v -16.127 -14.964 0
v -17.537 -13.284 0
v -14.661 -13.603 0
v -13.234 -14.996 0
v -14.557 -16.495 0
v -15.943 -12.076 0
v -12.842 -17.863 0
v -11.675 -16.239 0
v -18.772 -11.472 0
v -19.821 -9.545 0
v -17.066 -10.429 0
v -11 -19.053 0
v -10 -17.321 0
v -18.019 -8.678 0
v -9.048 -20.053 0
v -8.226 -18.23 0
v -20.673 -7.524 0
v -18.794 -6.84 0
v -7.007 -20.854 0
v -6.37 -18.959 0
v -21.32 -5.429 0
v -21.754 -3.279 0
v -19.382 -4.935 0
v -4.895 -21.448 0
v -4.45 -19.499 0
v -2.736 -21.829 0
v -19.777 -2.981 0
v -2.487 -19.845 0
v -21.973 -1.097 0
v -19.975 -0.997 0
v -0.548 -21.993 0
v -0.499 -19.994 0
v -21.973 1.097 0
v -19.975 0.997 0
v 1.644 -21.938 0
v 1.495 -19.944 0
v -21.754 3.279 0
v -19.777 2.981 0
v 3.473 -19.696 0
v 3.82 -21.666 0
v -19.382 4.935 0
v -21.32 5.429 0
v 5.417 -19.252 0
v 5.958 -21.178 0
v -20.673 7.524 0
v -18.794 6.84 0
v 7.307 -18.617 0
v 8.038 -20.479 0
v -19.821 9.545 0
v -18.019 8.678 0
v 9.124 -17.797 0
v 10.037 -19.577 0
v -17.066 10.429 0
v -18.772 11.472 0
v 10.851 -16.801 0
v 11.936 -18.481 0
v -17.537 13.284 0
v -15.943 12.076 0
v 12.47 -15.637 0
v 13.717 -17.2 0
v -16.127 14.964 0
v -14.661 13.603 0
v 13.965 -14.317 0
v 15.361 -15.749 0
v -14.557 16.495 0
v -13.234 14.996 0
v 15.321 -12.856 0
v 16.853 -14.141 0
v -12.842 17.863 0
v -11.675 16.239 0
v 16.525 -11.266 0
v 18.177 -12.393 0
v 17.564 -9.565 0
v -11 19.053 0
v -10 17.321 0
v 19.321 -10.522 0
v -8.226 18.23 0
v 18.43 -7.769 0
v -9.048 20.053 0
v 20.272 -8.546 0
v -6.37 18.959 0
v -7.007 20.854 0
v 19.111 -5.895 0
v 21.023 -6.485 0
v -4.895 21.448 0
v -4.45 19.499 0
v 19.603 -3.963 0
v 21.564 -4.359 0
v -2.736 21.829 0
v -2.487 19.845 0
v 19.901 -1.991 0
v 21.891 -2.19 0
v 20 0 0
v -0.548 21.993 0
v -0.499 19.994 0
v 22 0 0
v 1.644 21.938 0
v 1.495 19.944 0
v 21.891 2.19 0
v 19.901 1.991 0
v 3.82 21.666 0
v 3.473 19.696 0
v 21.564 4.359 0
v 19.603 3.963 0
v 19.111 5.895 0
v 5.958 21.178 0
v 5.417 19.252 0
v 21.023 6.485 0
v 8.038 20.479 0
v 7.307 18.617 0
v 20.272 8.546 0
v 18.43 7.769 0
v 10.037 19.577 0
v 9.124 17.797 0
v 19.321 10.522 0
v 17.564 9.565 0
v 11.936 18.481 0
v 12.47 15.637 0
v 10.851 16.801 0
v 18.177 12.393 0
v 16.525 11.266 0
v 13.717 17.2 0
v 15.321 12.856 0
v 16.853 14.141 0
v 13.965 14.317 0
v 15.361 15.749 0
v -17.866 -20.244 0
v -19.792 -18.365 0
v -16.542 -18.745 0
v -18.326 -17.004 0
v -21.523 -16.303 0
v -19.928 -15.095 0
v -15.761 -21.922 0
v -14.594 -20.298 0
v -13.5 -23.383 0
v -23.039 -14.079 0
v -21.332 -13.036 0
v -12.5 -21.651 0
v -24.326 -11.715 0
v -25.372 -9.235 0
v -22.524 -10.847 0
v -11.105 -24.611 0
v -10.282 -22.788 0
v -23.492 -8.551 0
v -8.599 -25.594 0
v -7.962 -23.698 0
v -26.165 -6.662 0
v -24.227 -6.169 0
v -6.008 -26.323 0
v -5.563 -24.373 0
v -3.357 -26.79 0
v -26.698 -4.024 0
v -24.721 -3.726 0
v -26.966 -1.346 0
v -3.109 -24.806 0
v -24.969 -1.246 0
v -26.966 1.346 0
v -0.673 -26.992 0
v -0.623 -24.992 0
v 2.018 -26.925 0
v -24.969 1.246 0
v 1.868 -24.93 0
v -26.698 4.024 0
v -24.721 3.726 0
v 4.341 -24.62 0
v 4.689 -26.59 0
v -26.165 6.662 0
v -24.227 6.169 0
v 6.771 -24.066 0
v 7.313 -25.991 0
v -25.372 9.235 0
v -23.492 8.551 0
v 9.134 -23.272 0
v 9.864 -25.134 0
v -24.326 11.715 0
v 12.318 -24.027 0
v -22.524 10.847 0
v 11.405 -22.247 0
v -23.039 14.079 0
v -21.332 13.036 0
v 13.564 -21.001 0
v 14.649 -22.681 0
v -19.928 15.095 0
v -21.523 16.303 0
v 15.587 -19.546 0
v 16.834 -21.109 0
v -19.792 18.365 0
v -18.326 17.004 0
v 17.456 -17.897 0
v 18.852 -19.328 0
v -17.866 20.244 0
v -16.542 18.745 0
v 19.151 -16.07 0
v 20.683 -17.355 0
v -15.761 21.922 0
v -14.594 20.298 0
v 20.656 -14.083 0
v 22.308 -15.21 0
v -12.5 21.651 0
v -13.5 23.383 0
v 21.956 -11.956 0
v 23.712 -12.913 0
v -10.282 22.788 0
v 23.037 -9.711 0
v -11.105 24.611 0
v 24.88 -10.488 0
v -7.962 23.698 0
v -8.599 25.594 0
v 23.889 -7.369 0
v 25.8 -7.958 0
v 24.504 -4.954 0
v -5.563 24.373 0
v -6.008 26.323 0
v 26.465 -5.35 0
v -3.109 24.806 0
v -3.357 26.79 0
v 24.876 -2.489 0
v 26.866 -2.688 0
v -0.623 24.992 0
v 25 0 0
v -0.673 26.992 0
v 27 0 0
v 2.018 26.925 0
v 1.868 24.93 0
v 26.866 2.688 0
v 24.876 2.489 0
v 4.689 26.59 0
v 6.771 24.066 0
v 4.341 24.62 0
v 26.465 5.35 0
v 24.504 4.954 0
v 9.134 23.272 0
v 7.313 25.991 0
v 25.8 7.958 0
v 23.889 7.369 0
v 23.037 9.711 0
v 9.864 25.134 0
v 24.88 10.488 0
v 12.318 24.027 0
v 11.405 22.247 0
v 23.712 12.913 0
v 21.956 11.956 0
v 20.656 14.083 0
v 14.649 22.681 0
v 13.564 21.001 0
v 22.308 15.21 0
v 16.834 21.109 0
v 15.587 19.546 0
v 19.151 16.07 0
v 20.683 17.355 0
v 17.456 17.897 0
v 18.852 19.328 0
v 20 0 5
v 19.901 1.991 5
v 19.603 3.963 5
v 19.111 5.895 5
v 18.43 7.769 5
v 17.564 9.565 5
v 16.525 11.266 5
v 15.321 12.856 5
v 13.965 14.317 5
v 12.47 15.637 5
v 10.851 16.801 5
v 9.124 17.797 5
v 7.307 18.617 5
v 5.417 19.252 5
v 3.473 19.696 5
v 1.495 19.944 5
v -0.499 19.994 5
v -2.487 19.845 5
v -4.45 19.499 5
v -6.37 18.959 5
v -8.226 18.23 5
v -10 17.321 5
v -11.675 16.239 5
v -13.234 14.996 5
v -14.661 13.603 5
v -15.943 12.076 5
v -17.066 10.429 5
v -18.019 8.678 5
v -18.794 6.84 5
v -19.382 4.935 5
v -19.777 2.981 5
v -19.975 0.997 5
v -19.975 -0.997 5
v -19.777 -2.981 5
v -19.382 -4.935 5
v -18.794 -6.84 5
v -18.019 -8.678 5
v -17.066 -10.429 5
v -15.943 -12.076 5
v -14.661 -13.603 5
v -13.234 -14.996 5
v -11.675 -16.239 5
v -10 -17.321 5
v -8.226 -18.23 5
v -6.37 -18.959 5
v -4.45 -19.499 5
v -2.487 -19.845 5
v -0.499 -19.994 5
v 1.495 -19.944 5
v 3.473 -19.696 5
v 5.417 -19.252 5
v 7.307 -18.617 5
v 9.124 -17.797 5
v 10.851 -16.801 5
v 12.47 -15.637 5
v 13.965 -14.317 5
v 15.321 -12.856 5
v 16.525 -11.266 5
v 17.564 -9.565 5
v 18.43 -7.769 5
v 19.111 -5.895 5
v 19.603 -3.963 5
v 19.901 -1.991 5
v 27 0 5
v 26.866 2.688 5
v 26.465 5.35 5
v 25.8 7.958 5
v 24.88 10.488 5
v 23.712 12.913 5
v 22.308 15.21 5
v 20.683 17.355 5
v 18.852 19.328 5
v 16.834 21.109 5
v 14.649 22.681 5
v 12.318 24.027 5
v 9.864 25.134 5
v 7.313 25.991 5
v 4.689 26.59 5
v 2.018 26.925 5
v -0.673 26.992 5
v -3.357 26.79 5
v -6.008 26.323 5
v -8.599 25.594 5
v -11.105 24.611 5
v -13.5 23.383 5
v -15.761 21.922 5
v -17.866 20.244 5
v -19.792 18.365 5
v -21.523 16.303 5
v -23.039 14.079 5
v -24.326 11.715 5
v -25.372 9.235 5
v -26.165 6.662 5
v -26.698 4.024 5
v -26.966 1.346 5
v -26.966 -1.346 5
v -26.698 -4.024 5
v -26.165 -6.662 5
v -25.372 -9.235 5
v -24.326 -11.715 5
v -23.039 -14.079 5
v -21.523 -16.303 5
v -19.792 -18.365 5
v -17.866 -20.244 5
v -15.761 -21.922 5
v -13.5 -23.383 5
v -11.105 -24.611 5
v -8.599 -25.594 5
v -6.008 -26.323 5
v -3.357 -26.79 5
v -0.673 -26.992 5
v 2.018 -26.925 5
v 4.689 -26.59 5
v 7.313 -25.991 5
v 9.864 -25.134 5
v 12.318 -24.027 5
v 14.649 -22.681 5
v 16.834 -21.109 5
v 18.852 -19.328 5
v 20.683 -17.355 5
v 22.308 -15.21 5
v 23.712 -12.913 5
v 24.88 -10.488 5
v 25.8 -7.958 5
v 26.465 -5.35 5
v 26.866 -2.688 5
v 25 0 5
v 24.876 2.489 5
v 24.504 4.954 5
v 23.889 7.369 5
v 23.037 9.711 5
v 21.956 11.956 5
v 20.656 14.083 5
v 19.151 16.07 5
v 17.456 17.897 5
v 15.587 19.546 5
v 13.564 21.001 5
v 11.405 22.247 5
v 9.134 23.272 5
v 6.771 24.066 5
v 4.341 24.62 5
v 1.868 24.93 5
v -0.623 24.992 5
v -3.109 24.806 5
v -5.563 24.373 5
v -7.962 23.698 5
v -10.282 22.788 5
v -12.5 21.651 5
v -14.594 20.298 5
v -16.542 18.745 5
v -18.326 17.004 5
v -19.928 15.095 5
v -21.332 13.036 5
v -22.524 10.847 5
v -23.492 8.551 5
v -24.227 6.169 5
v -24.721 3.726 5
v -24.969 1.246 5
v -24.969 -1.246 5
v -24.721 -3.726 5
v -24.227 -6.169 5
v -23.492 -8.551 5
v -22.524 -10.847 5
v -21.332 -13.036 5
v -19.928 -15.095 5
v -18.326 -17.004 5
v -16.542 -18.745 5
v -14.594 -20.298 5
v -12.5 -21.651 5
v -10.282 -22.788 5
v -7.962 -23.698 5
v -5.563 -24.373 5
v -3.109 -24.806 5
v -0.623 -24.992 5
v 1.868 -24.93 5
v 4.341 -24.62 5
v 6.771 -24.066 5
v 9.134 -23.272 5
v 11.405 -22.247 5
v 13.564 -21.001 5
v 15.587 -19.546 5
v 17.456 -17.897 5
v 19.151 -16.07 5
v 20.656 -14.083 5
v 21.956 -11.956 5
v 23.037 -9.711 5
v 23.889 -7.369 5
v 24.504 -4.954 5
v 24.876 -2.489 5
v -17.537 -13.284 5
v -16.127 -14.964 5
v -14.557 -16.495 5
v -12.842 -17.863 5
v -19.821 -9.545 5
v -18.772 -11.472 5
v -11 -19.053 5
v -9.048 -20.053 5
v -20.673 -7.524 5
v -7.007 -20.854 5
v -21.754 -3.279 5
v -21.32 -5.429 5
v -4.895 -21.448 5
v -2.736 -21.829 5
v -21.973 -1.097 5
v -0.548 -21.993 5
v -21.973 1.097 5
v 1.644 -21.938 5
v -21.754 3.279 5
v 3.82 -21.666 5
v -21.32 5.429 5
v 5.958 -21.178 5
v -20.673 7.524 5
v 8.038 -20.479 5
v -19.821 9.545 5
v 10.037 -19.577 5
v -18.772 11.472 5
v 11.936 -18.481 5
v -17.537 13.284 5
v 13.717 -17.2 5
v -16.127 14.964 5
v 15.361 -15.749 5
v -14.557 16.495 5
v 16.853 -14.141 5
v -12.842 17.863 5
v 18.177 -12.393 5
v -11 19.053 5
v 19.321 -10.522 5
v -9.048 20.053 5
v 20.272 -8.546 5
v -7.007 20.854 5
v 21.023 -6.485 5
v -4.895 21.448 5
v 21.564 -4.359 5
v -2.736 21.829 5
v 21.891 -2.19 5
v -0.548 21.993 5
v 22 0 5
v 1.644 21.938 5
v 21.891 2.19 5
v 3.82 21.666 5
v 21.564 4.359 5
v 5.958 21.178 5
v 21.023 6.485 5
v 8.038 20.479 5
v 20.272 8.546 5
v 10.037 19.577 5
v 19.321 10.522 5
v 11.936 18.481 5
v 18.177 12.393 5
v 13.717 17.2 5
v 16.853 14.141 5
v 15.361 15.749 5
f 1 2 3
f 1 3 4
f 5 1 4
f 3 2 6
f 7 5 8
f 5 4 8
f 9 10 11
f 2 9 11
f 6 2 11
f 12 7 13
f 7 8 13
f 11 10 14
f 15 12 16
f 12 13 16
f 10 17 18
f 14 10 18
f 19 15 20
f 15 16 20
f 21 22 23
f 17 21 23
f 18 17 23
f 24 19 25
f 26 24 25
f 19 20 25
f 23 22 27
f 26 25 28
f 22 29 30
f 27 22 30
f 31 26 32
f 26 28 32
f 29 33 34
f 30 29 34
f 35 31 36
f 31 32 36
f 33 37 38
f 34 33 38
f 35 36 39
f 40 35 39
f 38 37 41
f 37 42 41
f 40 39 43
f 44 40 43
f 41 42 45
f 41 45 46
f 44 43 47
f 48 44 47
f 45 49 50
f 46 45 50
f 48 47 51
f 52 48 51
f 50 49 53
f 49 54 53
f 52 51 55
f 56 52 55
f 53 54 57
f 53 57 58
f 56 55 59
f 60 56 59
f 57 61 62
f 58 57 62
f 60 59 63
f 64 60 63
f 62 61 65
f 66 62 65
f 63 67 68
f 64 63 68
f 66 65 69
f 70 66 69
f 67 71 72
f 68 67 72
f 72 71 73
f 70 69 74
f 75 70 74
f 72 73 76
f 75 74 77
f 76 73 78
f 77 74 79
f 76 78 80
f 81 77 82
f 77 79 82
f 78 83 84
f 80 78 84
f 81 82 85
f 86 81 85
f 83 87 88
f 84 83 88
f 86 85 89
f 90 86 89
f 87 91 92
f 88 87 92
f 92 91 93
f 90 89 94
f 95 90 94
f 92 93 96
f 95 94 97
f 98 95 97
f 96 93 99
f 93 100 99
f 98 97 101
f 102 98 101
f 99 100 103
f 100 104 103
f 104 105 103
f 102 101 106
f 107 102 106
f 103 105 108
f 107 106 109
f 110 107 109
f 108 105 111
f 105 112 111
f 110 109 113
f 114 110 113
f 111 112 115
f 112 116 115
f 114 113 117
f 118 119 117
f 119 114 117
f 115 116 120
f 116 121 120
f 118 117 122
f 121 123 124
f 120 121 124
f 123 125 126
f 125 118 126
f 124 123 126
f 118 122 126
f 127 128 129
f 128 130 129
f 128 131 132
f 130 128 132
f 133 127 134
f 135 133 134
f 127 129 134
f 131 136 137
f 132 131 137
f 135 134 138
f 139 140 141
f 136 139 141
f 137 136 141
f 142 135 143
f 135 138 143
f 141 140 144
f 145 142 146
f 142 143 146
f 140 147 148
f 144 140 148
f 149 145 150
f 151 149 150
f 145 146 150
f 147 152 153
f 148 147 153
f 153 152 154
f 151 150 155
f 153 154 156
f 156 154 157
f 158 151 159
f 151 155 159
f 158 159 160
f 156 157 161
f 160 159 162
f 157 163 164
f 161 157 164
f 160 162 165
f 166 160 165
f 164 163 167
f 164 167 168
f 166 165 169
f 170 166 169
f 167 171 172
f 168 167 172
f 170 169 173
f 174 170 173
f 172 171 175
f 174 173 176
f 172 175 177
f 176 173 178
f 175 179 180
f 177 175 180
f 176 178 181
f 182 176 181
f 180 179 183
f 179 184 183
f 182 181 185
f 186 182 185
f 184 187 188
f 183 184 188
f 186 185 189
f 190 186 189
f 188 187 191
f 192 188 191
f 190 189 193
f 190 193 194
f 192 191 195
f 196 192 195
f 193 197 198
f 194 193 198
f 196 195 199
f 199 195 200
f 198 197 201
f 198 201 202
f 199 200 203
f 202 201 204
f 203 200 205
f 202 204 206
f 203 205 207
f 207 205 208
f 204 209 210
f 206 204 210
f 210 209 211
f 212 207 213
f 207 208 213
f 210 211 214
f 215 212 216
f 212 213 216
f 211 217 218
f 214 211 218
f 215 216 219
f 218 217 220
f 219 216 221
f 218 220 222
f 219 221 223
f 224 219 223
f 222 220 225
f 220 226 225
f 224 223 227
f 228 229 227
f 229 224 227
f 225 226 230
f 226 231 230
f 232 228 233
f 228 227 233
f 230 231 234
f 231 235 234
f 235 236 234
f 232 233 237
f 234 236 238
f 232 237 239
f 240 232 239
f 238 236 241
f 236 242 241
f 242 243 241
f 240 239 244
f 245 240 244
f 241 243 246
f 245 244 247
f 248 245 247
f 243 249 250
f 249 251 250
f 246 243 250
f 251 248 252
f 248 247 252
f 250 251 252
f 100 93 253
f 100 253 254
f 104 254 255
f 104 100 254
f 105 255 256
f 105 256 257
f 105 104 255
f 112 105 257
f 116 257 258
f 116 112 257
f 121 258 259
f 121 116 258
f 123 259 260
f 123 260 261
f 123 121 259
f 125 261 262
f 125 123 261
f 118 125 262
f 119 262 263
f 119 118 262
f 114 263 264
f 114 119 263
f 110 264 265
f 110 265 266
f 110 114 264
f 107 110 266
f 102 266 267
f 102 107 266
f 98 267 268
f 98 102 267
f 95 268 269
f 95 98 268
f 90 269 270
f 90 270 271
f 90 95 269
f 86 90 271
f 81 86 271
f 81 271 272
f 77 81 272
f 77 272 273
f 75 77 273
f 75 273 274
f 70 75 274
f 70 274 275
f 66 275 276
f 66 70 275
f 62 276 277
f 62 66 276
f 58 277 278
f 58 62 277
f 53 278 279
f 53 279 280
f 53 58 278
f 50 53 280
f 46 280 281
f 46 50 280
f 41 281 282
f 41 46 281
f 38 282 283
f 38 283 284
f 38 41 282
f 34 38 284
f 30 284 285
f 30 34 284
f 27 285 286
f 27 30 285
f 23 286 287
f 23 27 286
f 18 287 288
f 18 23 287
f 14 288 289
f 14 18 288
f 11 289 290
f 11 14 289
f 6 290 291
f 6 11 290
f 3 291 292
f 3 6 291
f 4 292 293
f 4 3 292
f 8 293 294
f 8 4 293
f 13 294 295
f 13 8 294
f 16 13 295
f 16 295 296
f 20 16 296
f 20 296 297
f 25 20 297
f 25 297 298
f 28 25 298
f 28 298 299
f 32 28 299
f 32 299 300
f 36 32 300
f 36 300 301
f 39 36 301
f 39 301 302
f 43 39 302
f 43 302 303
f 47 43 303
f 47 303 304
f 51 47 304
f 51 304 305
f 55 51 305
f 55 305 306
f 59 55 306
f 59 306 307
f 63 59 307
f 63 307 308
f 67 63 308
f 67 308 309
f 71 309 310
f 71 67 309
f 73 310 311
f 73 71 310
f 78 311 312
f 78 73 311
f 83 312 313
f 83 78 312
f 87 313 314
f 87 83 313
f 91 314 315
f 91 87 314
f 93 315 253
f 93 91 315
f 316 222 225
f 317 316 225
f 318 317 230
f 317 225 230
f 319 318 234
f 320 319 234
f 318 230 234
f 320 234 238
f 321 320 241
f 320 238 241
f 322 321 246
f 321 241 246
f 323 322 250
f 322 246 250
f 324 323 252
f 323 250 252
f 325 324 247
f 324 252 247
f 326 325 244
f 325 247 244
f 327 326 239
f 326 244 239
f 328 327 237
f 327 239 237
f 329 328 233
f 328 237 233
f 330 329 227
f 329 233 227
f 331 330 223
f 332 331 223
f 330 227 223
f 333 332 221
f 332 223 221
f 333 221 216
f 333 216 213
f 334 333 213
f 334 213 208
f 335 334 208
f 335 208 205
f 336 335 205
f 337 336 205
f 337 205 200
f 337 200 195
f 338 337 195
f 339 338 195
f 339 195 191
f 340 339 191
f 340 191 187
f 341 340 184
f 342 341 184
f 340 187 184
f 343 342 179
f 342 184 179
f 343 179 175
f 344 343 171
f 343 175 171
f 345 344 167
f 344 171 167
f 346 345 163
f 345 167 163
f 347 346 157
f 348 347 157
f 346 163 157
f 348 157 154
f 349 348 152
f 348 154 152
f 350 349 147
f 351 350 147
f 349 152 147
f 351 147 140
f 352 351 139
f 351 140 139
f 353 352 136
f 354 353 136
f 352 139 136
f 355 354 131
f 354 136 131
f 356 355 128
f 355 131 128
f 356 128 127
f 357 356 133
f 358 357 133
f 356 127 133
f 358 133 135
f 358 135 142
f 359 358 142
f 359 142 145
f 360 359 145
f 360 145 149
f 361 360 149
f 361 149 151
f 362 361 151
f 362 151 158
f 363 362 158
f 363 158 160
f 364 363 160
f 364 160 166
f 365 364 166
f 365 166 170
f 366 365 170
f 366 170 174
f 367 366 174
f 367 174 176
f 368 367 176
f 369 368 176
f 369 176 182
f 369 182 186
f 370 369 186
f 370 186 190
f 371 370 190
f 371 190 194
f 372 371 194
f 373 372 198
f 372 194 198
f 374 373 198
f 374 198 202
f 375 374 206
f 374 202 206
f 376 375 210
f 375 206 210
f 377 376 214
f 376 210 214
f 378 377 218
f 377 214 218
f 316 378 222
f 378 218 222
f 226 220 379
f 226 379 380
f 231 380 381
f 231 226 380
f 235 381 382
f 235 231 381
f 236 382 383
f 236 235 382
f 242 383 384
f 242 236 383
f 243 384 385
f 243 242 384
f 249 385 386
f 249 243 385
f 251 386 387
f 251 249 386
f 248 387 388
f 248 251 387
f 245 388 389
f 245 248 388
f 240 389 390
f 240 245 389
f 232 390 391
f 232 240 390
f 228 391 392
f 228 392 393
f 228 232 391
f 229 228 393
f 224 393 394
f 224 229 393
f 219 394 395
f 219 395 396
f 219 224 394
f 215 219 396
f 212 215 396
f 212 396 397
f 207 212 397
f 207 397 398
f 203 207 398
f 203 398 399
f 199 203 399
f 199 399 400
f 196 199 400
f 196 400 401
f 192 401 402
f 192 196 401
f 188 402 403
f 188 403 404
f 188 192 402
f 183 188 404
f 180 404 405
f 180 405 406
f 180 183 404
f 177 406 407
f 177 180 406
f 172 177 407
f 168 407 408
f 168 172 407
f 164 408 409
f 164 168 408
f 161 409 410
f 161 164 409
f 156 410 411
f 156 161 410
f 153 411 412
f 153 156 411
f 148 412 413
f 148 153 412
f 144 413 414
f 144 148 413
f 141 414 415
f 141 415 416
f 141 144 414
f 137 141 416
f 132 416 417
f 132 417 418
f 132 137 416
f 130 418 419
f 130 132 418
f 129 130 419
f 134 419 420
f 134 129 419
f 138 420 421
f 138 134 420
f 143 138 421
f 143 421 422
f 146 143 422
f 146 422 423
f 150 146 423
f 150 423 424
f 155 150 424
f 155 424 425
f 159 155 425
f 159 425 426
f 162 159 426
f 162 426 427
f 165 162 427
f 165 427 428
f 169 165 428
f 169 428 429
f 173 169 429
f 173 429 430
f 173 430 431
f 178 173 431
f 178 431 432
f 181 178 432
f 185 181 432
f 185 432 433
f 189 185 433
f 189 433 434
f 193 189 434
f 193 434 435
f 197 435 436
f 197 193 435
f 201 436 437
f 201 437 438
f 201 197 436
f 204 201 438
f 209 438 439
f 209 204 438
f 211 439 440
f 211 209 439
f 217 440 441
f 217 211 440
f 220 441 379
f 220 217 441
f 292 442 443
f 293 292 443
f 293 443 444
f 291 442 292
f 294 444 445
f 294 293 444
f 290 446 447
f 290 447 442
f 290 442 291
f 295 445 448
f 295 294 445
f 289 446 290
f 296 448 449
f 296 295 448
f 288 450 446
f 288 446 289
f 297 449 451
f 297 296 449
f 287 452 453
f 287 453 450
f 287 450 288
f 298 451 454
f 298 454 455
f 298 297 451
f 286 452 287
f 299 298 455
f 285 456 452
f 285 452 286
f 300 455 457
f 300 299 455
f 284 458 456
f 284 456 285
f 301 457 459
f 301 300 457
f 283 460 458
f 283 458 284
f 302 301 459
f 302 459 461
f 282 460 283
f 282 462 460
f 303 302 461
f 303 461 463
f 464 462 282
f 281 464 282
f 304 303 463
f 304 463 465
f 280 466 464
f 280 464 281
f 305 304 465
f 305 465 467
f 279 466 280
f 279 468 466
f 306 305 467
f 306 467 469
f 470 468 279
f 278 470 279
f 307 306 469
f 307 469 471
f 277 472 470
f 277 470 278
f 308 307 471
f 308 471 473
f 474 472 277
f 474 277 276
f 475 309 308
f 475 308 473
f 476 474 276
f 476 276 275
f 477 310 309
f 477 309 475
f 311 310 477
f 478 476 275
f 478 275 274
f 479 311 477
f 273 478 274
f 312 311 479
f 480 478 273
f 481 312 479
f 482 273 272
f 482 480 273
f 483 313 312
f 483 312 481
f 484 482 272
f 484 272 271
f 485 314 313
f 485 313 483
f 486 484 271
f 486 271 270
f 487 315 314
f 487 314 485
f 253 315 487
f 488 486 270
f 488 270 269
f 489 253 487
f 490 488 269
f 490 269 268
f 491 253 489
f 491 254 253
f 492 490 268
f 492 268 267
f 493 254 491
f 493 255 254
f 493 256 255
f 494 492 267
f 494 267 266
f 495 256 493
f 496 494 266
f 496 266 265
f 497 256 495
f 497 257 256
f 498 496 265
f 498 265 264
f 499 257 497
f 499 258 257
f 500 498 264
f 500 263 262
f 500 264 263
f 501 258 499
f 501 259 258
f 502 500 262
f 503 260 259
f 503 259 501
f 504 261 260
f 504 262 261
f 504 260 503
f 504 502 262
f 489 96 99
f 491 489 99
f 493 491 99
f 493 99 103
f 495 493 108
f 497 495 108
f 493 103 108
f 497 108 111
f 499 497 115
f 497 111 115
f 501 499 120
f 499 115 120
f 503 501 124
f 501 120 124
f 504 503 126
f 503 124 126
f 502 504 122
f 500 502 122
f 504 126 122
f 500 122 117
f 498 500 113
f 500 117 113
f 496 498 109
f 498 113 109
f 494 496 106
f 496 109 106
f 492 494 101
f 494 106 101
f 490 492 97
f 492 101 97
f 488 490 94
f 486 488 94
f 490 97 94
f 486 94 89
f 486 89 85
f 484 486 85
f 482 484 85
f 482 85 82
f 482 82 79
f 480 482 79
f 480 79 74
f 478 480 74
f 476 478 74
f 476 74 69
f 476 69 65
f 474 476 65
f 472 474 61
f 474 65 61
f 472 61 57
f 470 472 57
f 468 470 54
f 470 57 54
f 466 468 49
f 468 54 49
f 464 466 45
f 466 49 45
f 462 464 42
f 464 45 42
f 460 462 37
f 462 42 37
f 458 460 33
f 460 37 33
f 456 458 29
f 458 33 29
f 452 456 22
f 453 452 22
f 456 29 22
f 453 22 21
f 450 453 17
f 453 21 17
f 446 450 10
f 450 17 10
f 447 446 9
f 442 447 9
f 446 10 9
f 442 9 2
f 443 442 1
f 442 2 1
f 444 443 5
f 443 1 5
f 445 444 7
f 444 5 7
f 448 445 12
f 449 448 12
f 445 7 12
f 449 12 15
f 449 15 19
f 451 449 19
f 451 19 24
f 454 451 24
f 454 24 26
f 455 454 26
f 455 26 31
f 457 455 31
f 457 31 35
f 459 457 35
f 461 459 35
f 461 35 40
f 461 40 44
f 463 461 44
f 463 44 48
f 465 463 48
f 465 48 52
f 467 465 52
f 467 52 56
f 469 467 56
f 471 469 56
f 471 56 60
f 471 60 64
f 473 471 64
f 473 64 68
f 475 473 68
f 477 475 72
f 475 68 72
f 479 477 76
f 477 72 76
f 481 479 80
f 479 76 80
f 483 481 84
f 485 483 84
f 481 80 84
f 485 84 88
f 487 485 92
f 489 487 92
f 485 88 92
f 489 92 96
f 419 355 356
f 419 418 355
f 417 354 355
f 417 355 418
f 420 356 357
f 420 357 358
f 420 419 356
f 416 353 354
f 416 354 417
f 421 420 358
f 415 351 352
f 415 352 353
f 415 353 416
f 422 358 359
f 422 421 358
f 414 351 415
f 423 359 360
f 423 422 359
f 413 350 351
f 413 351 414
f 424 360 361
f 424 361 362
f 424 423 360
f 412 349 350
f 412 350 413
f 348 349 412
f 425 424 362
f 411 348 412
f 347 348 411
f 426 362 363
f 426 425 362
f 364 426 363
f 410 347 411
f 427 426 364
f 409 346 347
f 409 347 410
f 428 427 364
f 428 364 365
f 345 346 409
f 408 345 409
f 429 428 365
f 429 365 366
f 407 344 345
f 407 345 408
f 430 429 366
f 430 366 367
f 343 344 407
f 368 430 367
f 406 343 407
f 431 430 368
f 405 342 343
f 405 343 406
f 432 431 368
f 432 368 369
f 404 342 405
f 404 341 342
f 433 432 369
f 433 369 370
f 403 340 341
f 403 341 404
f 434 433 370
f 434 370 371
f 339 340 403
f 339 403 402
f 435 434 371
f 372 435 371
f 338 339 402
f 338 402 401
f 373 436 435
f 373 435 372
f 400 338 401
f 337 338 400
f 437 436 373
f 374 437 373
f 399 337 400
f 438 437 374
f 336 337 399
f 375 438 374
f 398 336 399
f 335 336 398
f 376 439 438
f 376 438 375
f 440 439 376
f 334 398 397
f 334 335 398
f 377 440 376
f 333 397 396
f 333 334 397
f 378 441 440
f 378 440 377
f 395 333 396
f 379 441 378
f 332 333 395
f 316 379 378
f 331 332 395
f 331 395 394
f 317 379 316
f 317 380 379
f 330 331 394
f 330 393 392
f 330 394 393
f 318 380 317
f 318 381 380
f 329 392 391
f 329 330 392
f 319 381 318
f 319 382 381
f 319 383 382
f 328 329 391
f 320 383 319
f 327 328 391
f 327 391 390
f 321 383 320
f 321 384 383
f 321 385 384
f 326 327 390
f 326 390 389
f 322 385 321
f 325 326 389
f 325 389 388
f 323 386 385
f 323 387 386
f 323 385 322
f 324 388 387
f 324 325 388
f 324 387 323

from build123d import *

# Parameters (mm, degrees)
SKETCH1_R             = 22
SKETCH1_R_2           = 20
BOSS_EXTRUDE3_DEPTH   = 5
SKETCH1_R_3           = 27
SKETCH1_R_4           = 25
BOSS_EXTRUDE3_2_DEPTH = 5


with BuildPart() as part:
    # Sketch1 → Boss-Extrude3 (new body)
    with BuildSketch(Plane.XY):
        Circle(SKETCH1_R)
        Circle(SKETCH1_R_2, mode=Mode.SUBTRACT)
    extrude(amount=BOSS_EXTRUDE3_DEPTH)


with BuildPart() as body_2:
    # Sketch1 → Boss-Extrude3 2 (new body)
    with BuildSketch(Plane.XY):
        Circle(SKETCH1_R_3)
        Circle(SKETCH1_R_4, mode=Mode.SUBTRACT)
    extrude(amount=BOSS_EXTRUDE3_2_DEPTH)


solid = Compound([part.part, body_2.part])
